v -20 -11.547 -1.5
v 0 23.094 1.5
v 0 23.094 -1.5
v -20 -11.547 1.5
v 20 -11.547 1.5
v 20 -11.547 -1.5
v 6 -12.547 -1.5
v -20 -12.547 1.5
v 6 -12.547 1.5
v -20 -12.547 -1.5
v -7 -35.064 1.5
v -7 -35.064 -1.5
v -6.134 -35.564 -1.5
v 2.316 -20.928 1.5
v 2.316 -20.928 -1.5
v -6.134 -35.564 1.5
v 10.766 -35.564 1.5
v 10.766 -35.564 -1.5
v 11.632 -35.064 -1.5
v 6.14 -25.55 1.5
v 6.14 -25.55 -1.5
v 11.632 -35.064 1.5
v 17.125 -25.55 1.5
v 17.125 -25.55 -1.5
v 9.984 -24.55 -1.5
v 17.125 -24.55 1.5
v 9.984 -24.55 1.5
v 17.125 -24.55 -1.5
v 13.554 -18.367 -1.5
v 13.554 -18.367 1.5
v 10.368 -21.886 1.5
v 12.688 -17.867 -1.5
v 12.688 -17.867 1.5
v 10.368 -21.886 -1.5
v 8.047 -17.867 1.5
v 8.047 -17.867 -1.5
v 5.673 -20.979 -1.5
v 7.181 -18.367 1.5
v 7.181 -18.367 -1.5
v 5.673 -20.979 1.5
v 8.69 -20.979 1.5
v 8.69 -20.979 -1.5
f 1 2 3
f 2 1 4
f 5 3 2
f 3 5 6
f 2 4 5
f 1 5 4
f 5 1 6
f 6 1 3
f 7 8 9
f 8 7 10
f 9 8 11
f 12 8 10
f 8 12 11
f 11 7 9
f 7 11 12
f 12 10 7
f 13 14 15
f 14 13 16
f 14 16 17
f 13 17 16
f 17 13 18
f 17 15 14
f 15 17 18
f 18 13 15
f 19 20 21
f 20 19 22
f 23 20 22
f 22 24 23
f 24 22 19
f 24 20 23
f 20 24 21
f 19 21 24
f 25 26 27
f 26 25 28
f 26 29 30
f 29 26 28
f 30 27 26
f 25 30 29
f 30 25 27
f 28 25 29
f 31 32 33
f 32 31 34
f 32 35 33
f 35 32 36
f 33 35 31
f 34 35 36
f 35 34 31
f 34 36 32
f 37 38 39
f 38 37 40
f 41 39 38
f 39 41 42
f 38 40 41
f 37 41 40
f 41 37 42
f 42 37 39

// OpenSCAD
X = 0;
Y = 1;
Z = 2;

//-- Rotate a vector an angle phi around the Z axis
//-- INPUTS:t
//--   v: Vector to rotate
//--   phi: Angle to rotate (in degrees)
function Rotz(v, phi) = [v[X] * cos(phi) - v[Y] * sin(phi), 
                         v[X] * sin(phi) + v[Y] * cos(phi), 
                         0];

module triangle(l = 10, th = 3)
{
  rotate([0, 0, -30])
  cylinder(r = l * sqrt(3) / 3,
           h = th,
	   center = true,
           $fn = 3);
}

module pybonacci_logo( pos = [0, 0, 0],
                       ov = [0, -1, 0],  //-- Orientation vector
                       angle = 0,
                       side = 50, 
                     )

{
  

  translate(pos)
    rotate([0, 0, angle])
      triangle(l = side);          
}

//-- User parameters
f = 0.65;      //-- Reduction factor
offset = 1;   //-- Distance between adjacent triangles
side = 40;    //-- Initial triangle side
ang = 60;     //-- Rotation angle
ov = [0, -1, 0];  //-- Orientation

//-- Initial triangle (0)
color([255/255, 211/255, 52/255])
pybonacci_logo(angle = 0, side = side);


//-- Calculate the pos of the next triangle (1)
vn = sqrt(3)*(1 + f) * side / 6 + offset;
vt = side * (1 - f) / 2;
v = ov * vn + Rotz(ov, -90) * vt;
pos = v;


color([255/255, 230/255, 113/255])
pybonacci_logo(pos = pos,
               angle = ang,
               side = side * f);

//-- Calculate the next triangle (2)
side2 = side * f;
ov2 = Rotz(ov,60);
vn2 = sqrt(3)*(1 + f) * side2 / 6 + offset;
vt2 = side2 * (1 - f) / 2;
v2 = ov2 * vn2 + Rotz(ov2, -90) * vt2;

pos2 = pos + v2;

color([112/255, 164/255, 203/255])
pybonacci_logo(pos = pos2,
               angle = ang * 2,
               side = side2 * f);

//-- Calculate the next triangle (3)
side3 = side2 * f;
ov3 = Rotz(ov2,60);
vn3 = sqrt(3)*(1 + f) * side3 / 6 + offset;
vt3 = side3 * (1 - f) / 2;
v3 = ov3 * vn3 + Rotz(ov3, -90) * vt3;

pos3 = pos2 + v3;

color([80/255, 142/255, 191/255])
pybonacci_logo(pos = pos3,
               angle = ang * 3,
               side = side3 * f);

//-- Calculate the next triangle (4)
side4 = side3 * f;
ov4 = Rotz(ov3,60);
vn4 = sqrt(3)*(1 + f) * side4 / 6 + offset;
vt4 = side4 * (1 - f) / 2;
v4 = ov4 * vn4 + Rotz(ov4, -90) * vt4;

pos4 = pos3 + v4;

color([68/255, 133/255, 187/255])
pybonacci_logo(pos = pos4,
               angle = ang * 4,
               side = side4 * f);

//-- Calculate the next triangle (5)
side5 = side4 * f;
ov5 = Rotz(ov4,60);
vn5 = sqrt(3)*(1 + f) * side5 / 6 + offset;
vt5 = side5 * (1 - f) / 2;
v5 = ov5 * vn5 + Rotz(ov5, -90) * vt5;

pos5 = pos4 + v5;

color([63/255, 116/255, 168/255])
pybonacci_logo(pos = pos5,
               angle = ang * 5,
               side = side5 * f);

//-- Calculate the next triangle (6)
side6 = side5 * f;
ov6 = Rotz(ov5,60);
vn6 = sqrt(3)*(1 + f) * side6 / 6 + offset;
vt6 = side6 * (1 - f) / 2;
v6 = ov6 * vn6 + Rotz(ov6, -90) * vt6;

pos6 = pos5 + v6;

color([60/255, 97/255, 126/255])
pybonacci_logo(pos = pos6,
               angle = ang * 6,
               side = side6 * f);
